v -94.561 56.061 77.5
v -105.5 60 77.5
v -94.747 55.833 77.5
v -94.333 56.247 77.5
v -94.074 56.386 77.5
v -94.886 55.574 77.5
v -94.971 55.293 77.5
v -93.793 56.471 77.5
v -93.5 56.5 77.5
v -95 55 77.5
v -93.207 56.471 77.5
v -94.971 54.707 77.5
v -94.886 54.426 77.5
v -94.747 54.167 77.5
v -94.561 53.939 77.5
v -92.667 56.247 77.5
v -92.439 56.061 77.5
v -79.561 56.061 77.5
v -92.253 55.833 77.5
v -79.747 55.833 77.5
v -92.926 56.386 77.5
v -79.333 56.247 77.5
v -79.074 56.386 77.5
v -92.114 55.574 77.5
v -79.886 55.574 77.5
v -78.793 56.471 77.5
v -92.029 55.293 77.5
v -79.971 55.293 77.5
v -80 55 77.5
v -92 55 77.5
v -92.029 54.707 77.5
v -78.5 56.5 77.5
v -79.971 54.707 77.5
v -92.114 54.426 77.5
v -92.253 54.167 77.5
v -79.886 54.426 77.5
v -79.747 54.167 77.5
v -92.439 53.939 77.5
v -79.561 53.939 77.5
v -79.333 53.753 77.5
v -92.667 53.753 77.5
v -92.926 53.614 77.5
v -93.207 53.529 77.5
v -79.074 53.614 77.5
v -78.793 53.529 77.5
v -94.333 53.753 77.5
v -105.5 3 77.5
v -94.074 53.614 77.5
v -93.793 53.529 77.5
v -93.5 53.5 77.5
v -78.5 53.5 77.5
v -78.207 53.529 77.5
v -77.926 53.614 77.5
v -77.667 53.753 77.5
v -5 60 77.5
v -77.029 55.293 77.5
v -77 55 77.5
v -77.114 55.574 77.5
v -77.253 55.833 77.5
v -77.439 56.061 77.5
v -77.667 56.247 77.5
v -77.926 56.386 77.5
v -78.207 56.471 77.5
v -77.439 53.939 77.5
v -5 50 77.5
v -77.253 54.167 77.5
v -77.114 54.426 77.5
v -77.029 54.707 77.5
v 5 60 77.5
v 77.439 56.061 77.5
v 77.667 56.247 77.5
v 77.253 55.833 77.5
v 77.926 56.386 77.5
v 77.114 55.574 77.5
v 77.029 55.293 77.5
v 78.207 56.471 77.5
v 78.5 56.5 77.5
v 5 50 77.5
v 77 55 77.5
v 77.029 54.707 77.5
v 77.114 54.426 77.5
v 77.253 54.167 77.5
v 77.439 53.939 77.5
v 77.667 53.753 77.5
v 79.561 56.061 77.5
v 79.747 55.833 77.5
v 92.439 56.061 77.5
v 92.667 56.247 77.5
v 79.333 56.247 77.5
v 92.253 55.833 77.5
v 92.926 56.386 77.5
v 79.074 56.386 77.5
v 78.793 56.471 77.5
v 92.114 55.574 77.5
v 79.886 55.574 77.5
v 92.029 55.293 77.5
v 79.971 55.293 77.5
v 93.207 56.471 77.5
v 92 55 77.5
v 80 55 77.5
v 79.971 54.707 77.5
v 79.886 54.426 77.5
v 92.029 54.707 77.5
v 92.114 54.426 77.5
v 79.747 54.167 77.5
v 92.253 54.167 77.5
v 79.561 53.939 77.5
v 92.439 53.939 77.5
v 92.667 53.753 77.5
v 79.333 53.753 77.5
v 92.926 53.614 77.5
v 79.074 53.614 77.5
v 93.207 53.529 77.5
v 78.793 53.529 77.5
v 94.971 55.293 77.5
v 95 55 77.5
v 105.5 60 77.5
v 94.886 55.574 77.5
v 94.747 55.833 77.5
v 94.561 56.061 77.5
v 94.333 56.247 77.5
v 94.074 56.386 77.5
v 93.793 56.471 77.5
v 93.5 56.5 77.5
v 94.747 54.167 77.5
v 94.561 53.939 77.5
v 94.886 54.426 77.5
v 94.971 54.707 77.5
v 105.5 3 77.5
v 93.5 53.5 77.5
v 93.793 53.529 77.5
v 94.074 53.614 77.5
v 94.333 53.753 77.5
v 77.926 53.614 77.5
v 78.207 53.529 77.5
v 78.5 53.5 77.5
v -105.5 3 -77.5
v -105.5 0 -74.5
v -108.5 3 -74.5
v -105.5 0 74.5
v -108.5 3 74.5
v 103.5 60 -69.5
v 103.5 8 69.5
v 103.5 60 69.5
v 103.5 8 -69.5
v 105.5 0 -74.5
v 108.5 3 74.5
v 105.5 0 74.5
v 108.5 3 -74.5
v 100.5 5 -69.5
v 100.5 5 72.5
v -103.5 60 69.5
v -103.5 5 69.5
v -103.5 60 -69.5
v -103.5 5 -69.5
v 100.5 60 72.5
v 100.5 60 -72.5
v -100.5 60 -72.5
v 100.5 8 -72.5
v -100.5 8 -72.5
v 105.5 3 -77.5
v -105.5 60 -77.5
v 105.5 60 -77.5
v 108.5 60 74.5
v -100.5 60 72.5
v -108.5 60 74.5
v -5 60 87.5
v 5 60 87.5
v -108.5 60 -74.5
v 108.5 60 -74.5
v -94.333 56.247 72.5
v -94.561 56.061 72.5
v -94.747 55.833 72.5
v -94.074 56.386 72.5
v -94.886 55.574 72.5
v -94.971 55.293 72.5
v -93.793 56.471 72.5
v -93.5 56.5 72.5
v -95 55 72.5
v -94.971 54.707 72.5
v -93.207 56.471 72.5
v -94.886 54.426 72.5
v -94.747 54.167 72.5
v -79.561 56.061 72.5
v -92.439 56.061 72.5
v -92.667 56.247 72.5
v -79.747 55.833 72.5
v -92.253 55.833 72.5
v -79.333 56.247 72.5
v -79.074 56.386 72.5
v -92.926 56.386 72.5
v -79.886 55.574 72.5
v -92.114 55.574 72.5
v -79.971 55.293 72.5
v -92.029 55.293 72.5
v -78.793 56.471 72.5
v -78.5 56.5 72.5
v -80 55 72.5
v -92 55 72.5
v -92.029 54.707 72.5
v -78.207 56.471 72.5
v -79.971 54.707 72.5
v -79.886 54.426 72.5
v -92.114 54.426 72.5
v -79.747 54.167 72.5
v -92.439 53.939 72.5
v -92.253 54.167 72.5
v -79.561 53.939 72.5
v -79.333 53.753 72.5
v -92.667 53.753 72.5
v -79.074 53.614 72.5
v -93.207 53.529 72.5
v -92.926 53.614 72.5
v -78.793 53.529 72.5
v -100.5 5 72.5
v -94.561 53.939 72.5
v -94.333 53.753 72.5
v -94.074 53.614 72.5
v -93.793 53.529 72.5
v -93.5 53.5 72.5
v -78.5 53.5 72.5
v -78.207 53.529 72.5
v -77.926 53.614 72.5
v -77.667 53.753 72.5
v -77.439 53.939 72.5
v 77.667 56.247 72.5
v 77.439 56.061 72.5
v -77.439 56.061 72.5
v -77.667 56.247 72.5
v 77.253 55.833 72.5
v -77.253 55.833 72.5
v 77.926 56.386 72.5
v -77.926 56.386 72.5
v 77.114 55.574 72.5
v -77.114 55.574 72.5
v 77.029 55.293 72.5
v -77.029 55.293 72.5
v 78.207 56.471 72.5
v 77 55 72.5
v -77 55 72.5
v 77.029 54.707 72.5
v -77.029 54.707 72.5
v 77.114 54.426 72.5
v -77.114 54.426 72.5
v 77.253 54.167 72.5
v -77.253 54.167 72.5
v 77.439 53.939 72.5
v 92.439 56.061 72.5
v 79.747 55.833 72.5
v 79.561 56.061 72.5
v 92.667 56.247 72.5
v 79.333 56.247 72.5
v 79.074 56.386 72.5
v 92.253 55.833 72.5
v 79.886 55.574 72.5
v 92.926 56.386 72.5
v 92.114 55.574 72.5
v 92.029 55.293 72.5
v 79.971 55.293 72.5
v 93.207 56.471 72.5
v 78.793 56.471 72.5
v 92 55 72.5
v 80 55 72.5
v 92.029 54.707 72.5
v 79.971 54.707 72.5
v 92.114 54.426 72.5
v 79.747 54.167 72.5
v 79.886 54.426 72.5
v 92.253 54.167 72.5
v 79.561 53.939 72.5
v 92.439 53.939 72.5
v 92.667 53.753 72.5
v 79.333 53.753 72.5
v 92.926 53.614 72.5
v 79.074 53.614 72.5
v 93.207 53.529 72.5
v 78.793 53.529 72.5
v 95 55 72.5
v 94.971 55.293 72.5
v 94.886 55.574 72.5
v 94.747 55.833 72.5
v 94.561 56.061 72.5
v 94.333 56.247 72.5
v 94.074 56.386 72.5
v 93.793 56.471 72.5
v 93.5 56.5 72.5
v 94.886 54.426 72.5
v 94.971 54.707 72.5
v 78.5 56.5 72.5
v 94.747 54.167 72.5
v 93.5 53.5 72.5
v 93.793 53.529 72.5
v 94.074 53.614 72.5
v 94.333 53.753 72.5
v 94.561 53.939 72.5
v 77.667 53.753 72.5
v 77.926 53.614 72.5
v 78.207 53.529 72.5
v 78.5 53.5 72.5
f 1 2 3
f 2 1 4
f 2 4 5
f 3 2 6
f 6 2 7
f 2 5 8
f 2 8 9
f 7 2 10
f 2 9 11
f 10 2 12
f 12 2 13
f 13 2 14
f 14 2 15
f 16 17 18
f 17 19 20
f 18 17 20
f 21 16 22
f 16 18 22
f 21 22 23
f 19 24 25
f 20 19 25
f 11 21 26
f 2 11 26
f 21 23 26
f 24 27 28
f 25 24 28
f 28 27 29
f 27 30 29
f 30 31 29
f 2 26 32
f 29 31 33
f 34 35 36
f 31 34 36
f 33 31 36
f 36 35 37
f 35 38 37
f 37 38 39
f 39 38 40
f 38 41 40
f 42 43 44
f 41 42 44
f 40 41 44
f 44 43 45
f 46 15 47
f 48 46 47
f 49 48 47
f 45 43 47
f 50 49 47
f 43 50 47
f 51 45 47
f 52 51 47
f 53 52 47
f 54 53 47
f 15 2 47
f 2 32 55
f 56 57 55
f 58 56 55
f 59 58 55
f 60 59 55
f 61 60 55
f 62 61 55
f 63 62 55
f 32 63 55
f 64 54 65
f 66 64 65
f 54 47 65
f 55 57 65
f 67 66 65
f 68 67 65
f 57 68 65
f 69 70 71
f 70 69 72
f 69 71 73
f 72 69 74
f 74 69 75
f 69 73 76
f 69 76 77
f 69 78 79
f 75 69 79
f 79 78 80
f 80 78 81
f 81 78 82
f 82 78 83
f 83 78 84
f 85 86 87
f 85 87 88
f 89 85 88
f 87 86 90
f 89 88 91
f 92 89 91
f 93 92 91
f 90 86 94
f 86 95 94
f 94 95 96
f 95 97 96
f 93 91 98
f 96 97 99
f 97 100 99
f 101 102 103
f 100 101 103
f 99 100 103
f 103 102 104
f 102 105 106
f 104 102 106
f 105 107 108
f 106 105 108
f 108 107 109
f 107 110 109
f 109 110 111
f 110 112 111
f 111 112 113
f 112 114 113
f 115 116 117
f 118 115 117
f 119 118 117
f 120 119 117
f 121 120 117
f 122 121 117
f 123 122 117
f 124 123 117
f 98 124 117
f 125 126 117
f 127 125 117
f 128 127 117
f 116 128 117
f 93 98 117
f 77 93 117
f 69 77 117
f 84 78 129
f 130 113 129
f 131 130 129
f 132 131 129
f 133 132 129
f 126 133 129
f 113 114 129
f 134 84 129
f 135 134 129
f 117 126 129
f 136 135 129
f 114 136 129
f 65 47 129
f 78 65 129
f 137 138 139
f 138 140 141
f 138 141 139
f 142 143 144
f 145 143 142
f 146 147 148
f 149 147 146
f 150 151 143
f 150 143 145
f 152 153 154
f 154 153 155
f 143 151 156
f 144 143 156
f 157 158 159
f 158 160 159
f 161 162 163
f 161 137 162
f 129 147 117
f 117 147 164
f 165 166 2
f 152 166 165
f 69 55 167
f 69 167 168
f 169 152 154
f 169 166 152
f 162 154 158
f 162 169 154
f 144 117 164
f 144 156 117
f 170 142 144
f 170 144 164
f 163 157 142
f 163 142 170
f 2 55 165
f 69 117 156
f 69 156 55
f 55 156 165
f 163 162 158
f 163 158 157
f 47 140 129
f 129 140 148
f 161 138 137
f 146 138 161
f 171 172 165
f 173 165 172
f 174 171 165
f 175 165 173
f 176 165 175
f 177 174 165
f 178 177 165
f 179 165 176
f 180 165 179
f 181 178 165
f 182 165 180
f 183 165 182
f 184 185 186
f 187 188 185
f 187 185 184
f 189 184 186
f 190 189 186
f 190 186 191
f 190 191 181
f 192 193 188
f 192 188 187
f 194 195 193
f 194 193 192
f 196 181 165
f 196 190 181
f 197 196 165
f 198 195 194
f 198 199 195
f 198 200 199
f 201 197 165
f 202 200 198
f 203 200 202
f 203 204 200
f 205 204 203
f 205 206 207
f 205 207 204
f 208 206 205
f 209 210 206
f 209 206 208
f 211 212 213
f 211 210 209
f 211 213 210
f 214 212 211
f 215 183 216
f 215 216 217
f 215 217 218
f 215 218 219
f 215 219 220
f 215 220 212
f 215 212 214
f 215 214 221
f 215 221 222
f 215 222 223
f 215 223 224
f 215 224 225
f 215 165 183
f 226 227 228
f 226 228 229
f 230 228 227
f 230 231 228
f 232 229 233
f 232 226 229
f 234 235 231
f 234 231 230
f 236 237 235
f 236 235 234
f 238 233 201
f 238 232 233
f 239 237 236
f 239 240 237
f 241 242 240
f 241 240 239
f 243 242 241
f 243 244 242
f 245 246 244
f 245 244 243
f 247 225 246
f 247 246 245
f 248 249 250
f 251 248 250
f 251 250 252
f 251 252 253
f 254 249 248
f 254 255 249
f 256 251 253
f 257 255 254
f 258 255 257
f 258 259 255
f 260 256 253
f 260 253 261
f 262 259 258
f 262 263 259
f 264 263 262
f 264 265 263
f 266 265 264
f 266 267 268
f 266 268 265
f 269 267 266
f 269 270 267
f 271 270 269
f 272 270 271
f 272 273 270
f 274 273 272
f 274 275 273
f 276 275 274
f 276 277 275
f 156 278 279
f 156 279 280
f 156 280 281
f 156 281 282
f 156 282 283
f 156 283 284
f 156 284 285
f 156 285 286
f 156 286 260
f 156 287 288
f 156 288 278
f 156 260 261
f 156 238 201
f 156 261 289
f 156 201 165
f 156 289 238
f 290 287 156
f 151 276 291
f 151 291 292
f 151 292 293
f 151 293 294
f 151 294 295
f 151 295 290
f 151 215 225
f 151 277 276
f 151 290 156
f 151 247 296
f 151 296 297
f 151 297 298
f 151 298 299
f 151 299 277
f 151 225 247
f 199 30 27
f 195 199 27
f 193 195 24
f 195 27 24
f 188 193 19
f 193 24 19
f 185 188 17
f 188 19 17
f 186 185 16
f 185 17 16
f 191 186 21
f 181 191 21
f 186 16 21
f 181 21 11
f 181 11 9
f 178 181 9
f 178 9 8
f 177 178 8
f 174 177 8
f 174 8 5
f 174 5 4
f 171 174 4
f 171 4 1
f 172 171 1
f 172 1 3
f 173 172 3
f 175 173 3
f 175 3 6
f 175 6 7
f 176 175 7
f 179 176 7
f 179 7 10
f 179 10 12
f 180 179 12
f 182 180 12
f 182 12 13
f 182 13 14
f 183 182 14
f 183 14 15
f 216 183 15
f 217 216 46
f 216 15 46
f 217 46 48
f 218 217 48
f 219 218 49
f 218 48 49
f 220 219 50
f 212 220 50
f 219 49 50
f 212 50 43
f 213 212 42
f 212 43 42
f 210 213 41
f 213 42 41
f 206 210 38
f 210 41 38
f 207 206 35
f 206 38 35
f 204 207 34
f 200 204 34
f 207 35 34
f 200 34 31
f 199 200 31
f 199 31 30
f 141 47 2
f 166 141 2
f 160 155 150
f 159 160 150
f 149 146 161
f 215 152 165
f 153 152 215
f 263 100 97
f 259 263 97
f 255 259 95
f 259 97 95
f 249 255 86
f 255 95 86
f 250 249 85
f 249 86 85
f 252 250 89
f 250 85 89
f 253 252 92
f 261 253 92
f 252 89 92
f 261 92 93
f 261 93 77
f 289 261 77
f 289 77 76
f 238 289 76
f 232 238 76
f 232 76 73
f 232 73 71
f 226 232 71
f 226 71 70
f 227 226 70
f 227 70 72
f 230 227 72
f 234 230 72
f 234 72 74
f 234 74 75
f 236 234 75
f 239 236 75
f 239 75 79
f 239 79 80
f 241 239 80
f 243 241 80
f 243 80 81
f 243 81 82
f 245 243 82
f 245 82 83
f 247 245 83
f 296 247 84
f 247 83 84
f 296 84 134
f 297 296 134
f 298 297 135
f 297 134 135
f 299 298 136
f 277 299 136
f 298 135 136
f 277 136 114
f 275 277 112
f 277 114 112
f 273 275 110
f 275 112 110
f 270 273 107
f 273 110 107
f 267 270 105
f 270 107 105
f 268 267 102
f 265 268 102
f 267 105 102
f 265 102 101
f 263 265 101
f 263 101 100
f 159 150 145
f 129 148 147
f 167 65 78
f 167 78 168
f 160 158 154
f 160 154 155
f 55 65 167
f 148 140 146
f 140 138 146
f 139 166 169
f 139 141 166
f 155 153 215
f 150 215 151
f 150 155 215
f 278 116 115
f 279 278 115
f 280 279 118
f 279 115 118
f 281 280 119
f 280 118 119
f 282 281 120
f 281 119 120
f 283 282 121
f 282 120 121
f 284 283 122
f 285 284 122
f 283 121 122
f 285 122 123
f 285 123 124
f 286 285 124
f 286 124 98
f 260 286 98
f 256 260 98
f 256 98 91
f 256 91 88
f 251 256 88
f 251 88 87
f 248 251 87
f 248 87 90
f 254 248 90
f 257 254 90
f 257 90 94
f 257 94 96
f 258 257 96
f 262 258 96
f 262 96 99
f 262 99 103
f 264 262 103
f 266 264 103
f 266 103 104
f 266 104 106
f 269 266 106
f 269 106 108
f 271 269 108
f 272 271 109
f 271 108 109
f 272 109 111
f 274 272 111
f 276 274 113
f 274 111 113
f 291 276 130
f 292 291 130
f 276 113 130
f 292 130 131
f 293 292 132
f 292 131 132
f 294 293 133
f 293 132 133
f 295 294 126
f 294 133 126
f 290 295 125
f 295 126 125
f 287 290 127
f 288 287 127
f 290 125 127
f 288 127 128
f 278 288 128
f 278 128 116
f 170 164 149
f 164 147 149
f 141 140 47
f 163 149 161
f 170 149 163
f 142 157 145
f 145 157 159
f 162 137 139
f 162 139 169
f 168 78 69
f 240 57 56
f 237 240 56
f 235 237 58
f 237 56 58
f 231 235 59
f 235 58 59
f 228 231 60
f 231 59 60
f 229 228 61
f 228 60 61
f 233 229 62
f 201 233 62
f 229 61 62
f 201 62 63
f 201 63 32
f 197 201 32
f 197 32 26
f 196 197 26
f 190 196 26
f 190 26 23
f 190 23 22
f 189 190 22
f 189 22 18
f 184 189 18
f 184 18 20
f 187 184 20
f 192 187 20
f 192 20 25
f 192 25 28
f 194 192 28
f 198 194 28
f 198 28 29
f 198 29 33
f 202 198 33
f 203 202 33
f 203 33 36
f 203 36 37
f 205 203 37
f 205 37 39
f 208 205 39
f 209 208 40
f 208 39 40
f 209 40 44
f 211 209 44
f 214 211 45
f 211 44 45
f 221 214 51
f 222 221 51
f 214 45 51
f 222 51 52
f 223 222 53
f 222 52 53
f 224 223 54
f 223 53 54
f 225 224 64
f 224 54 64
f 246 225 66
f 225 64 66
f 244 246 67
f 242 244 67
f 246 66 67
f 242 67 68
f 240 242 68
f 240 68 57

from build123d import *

# Parameters (mm, degrees)
SKIZZE2_W                       = 217
SKIZZE2_H                       = 155
AUFSATZ_LINEAR_AUSTRAGEN1_DEPTH = 60
WANDUNG1_T                      = -5
SCHNITT_LINEAR_AUSTRAGEN1_REACH = 200.487
SKIZZE7_R                       = 1.5
SKIZZE8_W                       = 10
SKIZZE8_H                       = 10
AUFSATZ_LINEAR_AUSTRAGEN2_DEPTH = 10
SCHNITT_LINEAR_AUSTRAGEN2_REACH = 157.366
FASE1_SIZE                      = 3


with BuildPart() as part:
    # Skizze2 → Aufsatz-Linear austragen1 (new body)
    with BuildSketch(Plane(origin=(0, 0, 0), x_dir=(1, 0, 0), z_dir=(0, 1, 0))):
        Rectangle(SKIZZE2_W, SKIZZE2_H)
    extrude(amount=AUFSATZ_LINEAR_AUSTRAGEN1_DEPTH)

    # Wandung1
    wandung1_openings = [part.faces().sort_by_distance(p)[0] for p in [
        (0, 60, 0),
    ]]
    offset(amount=WANDUNG1_T, openings=wandung1_openings, kind=Kind.INTERSECTION)

    # Skizze7 → Schnitt-Linear austragen1 (cut, up to next)
    with BuildSketch(Plane.XY.offset(77.5), mode=Mode.PRIVATE) as schnitt_linear_austragen1_sk1:
        with Locations((-93.5, 55)):
            Circle(SKIZZE7_R)
    schnitt_linear_austragen1_tool1 = extrude(schnitt_linear_austragen1_sk1.sketch, amount=-SCHNITT_LINEAR_AUSTRAGEN1_REACH, mode=Mode.PRIVATE) & part.part
    # Skizze7 → Schnitt-Linear austragen1 (cut, up to next)
    with BuildSketch(Plane.XY.offset(77.5), mode=Mode.PRIVATE) as schnitt_linear_austragen1_sk2:
        with Locations((-78.5, 55)):
            Circle(SKIZZE7_R)
    schnitt_linear_austragen1_tool2 = extrude(schnitt_linear_austragen1_sk2.sketch, amount=-SCHNITT_LINEAR_AUSTRAGEN1_REACH, mode=Mode.PRIVATE) & part.part
    # Skizze7 → Schnitt-Linear austragen1 (cut, up to next)
    with BuildSketch(Plane.XY.offset(77.5), mode=Mode.PRIVATE) as schnitt_linear_austragen1_sk3:
        with Locations((78.5, 55)):
            Circle(SKIZZE7_R)
    schnitt_linear_austragen1_tool3 = extrude(schnitt_linear_austragen1_sk3.sketch, amount=-SCHNITT_LINEAR_AUSTRAGEN1_REACH, mode=Mode.PRIVATE) & part.part
    # Skizze7 → Schnitt-Linear austragen1 (cut, up to next)
    with BuildSketch(Plane.XY.offset(77.5), mode=Mode.PRIVATE) as schnitt_linear_austragen1_sk4:
        with Locations((93.5, 55)):
            Circle(SKIZZE7_R)
    schnitt_linear_austragen1_tool4 = extrude(schnitt_linear_austragen1_sk4.sketch, amount=-SCHNITT_LINEAR_AUSTRAGEN1_REACH, mode=Mode.PRIVATE) & part.part
    add(schnitt_linear_austragen1_tool1.solids().sort_by_distance((-93.5, 55, 77.5))[0], mode=Mode.SUBTRACT)
    add(schnitt_linear_austragen1_tool2.solids().sort_by_distance((-78.5, 55, 77.5))[0], mode=Mode.SUBTRACT)
    add(schnitt_linear_austragen1_tool3.solids().sort_by_distance((78.5, 55, 77.5))[0], mode=Mode.SUBTRACT)
    add(schnitt_linear_austragen1_tool4.solids().sort_by_distance((93.5, 55, 77.5))[0], mode=Mode.SUBTRACT)

    # Skizze8 → Aufsatz-Linear austragen2 (add)
    with BuildSketch(Plane.XY.offset(77.5)):
        with Locations((0, 55)):
            Rectangle(SKIZZE8_W, SKIZZE8_H)
    extrude(amount=AUFSATZ_LINEAR_AUSTRAGEN2_DEPTH)

    # Skizze9 → Schnitt-Linear austragen2 (cut, up to next)
    with BuildSketch(Plane.ZY.offset(5), mode=Mode.PRIVATE) as schnitt_linear_austragen2_sk1:
        Polygon((77.5, 50), (87.5, 60), (87.5, 50), align=None)
    schnitt_linear_austragen2_tool1 = extrude(schnitt_linear_austragen2_sk1.sketch, amount=-SCHNITT_LINEAR_AUSTRAGEN2_REACH, mode=Mode.PRIVATE) & part.part
    add(schnitt_linear_austragen2_tool1.solids().sort_by_distance((-5, 53.333333, 84.166667))[0], mode=Mode.SUBTRACT)

    # Fase1
    fase1_edges = [part.edges().sort_by_distance(p)[0] for p in [
        (103.5, 5, 0),
        (103.5, 32.5, 72.5),
        (0, 5, -72.5),
        (103.5, 32.5, -72.5),
        (-103.5, 32.5, -72.5),
        (-103.5, 32.5, 72.5),
        (0, 0, 77.5),
        (-108.5, 0, 0),
        (0, 0, -77.5),
        (108.5, 0, 0),
        (108.5, 30, 77.5),
        (-108.5, 30, 77.5),
        (-108.5, 30, -77.5),
        (108.5, 30, -77.5),
    ]]
    chamfer(fase1_edges, length=FASE1_SIZE)


solid = part.part
